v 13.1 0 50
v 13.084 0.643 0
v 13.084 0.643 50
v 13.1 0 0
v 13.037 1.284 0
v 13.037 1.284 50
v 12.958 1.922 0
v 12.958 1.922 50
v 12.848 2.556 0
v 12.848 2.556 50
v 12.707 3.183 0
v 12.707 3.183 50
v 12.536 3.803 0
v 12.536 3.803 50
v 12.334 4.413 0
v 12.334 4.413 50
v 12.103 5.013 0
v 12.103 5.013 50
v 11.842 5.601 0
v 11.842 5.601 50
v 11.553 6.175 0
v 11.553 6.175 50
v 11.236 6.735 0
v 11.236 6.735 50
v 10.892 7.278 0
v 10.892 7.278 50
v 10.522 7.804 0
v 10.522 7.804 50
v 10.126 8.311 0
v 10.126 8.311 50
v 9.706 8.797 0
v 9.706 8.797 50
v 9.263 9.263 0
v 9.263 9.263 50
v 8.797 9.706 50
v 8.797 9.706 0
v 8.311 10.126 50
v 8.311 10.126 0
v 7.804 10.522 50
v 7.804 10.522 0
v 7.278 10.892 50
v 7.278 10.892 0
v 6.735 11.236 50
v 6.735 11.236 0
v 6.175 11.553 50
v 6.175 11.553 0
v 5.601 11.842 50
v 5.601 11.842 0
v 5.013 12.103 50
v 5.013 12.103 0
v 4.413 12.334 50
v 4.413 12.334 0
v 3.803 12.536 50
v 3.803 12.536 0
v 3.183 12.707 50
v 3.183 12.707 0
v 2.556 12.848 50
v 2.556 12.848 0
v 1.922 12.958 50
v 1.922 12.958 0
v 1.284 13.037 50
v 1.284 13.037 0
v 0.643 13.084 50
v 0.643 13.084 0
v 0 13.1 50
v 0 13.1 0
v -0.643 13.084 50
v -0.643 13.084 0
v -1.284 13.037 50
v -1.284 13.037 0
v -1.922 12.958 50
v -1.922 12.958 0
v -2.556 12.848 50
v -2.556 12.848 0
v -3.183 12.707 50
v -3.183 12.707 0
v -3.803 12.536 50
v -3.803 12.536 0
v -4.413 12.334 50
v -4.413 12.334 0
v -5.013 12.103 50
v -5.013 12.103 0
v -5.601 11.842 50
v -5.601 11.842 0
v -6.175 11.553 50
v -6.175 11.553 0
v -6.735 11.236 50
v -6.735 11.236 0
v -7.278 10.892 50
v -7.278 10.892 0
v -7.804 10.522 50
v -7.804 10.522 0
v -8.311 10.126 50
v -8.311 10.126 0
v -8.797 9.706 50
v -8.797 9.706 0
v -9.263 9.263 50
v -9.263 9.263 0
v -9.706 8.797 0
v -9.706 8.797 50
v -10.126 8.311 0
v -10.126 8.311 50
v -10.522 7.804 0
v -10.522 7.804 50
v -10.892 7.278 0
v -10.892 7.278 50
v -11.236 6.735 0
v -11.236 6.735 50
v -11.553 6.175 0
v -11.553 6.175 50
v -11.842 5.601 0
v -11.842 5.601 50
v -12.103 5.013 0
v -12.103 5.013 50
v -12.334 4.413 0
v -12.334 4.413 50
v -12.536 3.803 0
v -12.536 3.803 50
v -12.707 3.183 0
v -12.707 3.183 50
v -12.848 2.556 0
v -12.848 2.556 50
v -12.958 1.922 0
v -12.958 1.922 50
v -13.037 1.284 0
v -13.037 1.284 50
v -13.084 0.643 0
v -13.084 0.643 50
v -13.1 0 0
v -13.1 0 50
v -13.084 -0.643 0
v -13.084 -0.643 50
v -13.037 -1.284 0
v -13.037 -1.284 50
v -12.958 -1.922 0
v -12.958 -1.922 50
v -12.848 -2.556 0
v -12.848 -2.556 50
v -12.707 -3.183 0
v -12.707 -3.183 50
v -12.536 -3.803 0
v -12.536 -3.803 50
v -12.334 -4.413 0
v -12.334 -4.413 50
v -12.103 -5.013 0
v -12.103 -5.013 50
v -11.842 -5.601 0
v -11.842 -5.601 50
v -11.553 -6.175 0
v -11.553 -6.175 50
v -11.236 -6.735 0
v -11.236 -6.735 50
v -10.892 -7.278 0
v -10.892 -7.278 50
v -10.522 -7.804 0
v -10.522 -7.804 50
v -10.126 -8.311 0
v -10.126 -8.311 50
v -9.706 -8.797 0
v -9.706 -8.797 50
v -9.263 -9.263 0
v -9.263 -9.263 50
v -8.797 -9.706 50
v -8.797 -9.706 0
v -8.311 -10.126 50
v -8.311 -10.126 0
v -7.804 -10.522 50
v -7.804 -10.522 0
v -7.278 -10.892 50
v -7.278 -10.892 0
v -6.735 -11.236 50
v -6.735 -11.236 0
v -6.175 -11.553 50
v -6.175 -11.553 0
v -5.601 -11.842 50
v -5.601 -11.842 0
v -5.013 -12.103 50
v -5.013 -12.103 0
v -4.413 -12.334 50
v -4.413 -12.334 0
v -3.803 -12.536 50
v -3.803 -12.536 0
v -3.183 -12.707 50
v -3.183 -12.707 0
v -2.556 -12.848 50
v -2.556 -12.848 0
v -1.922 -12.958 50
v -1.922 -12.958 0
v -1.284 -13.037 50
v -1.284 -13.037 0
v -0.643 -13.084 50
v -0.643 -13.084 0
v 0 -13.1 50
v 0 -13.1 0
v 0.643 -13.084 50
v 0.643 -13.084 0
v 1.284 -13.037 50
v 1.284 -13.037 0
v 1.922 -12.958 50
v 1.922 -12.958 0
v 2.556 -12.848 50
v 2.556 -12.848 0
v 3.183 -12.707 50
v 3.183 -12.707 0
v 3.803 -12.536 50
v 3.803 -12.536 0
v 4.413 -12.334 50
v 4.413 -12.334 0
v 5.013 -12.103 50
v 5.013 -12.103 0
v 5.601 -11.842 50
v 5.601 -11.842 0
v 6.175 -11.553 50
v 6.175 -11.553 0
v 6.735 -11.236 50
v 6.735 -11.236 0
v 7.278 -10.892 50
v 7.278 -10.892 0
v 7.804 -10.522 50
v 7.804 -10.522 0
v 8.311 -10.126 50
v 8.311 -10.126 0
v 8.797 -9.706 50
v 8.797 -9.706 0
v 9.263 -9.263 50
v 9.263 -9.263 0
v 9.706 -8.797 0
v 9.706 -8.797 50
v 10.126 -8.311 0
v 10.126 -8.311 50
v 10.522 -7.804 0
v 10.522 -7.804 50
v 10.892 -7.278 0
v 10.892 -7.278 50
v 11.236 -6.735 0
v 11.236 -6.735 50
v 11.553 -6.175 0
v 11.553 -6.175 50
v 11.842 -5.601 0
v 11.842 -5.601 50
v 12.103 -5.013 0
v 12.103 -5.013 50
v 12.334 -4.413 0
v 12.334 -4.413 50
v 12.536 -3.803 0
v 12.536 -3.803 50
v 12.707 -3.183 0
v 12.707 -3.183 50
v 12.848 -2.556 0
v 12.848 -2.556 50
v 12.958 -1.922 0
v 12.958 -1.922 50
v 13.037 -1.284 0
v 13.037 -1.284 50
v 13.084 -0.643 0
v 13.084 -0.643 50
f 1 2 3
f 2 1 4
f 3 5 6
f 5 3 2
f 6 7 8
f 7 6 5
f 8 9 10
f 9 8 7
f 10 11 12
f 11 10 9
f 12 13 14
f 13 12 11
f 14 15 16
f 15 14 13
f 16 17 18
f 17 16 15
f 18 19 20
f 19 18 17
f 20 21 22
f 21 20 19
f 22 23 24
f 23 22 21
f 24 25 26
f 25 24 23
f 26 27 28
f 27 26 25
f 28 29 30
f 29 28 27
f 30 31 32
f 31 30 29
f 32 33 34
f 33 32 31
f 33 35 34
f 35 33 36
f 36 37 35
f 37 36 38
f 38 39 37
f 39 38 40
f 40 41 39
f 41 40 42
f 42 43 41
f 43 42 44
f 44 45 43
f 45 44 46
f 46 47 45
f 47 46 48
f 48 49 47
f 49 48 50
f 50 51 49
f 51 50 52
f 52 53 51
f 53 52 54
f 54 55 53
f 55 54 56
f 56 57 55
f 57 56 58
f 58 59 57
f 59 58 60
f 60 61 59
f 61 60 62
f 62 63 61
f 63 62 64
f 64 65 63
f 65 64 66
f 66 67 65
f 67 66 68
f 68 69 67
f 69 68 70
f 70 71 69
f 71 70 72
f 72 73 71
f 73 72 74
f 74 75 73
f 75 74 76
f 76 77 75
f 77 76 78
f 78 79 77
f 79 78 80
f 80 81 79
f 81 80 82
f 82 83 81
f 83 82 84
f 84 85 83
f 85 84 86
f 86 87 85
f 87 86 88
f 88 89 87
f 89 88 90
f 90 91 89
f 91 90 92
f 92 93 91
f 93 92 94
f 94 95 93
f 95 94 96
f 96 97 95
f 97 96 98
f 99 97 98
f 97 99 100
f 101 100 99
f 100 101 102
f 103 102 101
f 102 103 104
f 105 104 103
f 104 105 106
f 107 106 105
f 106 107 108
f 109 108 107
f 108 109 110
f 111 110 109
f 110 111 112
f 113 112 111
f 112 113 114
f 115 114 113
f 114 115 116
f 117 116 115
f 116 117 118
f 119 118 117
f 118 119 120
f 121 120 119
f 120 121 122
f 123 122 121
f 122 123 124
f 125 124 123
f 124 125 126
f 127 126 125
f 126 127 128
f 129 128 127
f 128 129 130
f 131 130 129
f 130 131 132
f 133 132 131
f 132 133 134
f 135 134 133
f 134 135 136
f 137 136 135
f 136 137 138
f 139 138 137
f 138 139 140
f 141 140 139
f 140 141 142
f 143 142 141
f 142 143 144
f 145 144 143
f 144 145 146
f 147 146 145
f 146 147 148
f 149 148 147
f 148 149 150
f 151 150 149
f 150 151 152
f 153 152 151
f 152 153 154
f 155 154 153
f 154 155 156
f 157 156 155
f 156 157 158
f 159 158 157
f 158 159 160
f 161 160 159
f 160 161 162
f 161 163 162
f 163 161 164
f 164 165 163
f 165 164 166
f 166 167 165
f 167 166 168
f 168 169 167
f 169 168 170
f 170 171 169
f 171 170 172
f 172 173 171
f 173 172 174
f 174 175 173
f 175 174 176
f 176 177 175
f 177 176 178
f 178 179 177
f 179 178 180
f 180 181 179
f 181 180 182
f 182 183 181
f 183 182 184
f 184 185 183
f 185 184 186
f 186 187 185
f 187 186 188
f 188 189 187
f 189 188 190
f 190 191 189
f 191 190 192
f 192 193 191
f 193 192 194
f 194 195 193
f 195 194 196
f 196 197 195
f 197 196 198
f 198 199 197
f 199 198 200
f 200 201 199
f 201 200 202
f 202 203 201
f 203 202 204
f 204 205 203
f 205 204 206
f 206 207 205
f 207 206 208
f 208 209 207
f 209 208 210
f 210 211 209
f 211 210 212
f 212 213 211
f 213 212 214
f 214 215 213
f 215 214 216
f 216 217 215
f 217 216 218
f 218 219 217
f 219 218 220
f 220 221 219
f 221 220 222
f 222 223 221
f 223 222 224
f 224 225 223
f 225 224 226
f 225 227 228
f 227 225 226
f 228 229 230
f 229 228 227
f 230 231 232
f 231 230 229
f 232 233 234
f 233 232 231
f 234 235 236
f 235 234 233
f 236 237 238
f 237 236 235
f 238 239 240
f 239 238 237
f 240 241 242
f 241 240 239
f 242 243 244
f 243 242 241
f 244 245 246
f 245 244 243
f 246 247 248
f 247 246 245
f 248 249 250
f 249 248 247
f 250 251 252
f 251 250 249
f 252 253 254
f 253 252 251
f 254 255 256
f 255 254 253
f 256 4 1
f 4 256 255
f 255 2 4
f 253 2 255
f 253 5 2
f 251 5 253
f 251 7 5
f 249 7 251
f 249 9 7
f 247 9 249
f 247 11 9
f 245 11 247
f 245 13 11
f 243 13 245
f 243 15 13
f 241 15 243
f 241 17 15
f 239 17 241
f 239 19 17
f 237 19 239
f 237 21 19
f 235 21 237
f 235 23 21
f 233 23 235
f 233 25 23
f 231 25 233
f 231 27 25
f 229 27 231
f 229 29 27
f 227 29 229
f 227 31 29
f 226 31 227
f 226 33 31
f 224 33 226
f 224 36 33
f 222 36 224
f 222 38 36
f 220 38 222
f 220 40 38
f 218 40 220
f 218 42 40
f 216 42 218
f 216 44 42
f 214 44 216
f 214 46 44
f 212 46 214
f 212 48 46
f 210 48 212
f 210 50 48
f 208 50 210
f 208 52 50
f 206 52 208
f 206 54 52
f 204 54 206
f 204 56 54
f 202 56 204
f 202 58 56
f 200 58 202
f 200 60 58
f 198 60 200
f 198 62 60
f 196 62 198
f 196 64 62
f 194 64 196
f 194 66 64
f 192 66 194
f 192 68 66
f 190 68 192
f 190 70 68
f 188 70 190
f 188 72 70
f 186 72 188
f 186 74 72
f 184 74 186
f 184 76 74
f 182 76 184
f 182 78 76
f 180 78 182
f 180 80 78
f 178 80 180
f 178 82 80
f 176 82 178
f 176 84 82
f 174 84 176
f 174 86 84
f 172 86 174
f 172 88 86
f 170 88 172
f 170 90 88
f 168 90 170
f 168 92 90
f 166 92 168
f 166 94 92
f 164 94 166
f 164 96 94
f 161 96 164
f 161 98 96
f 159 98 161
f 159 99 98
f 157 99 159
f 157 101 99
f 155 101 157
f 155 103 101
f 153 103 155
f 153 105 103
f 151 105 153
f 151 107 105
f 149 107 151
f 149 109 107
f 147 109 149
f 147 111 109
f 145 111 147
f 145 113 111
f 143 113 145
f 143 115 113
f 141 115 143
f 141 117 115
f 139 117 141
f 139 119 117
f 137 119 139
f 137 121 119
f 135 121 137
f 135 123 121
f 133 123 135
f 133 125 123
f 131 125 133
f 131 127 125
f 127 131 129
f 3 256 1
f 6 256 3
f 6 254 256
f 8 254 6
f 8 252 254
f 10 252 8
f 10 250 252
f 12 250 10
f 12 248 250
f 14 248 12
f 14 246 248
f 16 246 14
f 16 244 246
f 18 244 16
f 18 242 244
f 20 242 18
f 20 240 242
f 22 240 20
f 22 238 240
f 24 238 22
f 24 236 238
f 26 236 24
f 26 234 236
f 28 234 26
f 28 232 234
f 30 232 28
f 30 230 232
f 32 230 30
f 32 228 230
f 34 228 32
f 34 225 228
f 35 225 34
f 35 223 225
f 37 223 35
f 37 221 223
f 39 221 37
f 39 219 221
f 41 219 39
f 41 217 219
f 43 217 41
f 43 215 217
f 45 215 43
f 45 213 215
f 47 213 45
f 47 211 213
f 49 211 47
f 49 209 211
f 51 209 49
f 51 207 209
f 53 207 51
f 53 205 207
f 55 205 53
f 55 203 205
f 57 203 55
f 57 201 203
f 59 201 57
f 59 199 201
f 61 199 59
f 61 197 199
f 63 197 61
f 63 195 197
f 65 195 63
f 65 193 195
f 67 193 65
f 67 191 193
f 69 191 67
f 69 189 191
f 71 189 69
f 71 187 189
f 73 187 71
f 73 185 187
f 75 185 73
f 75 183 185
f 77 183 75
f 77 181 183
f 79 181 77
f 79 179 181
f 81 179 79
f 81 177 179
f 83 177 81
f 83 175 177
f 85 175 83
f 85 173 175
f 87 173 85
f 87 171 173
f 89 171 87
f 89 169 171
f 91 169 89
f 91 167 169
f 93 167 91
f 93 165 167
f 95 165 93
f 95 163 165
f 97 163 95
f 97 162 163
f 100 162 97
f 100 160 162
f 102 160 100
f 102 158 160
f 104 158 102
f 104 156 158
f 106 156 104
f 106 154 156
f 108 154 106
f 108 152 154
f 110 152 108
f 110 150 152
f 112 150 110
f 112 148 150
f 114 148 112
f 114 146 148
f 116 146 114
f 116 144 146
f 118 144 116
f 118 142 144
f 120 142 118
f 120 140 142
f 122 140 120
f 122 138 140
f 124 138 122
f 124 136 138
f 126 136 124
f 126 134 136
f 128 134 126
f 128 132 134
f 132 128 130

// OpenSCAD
$fn = 128;

height = 50.0;
diameter = 26.2;

cylinder(h = height, d = diameter, center = false);
